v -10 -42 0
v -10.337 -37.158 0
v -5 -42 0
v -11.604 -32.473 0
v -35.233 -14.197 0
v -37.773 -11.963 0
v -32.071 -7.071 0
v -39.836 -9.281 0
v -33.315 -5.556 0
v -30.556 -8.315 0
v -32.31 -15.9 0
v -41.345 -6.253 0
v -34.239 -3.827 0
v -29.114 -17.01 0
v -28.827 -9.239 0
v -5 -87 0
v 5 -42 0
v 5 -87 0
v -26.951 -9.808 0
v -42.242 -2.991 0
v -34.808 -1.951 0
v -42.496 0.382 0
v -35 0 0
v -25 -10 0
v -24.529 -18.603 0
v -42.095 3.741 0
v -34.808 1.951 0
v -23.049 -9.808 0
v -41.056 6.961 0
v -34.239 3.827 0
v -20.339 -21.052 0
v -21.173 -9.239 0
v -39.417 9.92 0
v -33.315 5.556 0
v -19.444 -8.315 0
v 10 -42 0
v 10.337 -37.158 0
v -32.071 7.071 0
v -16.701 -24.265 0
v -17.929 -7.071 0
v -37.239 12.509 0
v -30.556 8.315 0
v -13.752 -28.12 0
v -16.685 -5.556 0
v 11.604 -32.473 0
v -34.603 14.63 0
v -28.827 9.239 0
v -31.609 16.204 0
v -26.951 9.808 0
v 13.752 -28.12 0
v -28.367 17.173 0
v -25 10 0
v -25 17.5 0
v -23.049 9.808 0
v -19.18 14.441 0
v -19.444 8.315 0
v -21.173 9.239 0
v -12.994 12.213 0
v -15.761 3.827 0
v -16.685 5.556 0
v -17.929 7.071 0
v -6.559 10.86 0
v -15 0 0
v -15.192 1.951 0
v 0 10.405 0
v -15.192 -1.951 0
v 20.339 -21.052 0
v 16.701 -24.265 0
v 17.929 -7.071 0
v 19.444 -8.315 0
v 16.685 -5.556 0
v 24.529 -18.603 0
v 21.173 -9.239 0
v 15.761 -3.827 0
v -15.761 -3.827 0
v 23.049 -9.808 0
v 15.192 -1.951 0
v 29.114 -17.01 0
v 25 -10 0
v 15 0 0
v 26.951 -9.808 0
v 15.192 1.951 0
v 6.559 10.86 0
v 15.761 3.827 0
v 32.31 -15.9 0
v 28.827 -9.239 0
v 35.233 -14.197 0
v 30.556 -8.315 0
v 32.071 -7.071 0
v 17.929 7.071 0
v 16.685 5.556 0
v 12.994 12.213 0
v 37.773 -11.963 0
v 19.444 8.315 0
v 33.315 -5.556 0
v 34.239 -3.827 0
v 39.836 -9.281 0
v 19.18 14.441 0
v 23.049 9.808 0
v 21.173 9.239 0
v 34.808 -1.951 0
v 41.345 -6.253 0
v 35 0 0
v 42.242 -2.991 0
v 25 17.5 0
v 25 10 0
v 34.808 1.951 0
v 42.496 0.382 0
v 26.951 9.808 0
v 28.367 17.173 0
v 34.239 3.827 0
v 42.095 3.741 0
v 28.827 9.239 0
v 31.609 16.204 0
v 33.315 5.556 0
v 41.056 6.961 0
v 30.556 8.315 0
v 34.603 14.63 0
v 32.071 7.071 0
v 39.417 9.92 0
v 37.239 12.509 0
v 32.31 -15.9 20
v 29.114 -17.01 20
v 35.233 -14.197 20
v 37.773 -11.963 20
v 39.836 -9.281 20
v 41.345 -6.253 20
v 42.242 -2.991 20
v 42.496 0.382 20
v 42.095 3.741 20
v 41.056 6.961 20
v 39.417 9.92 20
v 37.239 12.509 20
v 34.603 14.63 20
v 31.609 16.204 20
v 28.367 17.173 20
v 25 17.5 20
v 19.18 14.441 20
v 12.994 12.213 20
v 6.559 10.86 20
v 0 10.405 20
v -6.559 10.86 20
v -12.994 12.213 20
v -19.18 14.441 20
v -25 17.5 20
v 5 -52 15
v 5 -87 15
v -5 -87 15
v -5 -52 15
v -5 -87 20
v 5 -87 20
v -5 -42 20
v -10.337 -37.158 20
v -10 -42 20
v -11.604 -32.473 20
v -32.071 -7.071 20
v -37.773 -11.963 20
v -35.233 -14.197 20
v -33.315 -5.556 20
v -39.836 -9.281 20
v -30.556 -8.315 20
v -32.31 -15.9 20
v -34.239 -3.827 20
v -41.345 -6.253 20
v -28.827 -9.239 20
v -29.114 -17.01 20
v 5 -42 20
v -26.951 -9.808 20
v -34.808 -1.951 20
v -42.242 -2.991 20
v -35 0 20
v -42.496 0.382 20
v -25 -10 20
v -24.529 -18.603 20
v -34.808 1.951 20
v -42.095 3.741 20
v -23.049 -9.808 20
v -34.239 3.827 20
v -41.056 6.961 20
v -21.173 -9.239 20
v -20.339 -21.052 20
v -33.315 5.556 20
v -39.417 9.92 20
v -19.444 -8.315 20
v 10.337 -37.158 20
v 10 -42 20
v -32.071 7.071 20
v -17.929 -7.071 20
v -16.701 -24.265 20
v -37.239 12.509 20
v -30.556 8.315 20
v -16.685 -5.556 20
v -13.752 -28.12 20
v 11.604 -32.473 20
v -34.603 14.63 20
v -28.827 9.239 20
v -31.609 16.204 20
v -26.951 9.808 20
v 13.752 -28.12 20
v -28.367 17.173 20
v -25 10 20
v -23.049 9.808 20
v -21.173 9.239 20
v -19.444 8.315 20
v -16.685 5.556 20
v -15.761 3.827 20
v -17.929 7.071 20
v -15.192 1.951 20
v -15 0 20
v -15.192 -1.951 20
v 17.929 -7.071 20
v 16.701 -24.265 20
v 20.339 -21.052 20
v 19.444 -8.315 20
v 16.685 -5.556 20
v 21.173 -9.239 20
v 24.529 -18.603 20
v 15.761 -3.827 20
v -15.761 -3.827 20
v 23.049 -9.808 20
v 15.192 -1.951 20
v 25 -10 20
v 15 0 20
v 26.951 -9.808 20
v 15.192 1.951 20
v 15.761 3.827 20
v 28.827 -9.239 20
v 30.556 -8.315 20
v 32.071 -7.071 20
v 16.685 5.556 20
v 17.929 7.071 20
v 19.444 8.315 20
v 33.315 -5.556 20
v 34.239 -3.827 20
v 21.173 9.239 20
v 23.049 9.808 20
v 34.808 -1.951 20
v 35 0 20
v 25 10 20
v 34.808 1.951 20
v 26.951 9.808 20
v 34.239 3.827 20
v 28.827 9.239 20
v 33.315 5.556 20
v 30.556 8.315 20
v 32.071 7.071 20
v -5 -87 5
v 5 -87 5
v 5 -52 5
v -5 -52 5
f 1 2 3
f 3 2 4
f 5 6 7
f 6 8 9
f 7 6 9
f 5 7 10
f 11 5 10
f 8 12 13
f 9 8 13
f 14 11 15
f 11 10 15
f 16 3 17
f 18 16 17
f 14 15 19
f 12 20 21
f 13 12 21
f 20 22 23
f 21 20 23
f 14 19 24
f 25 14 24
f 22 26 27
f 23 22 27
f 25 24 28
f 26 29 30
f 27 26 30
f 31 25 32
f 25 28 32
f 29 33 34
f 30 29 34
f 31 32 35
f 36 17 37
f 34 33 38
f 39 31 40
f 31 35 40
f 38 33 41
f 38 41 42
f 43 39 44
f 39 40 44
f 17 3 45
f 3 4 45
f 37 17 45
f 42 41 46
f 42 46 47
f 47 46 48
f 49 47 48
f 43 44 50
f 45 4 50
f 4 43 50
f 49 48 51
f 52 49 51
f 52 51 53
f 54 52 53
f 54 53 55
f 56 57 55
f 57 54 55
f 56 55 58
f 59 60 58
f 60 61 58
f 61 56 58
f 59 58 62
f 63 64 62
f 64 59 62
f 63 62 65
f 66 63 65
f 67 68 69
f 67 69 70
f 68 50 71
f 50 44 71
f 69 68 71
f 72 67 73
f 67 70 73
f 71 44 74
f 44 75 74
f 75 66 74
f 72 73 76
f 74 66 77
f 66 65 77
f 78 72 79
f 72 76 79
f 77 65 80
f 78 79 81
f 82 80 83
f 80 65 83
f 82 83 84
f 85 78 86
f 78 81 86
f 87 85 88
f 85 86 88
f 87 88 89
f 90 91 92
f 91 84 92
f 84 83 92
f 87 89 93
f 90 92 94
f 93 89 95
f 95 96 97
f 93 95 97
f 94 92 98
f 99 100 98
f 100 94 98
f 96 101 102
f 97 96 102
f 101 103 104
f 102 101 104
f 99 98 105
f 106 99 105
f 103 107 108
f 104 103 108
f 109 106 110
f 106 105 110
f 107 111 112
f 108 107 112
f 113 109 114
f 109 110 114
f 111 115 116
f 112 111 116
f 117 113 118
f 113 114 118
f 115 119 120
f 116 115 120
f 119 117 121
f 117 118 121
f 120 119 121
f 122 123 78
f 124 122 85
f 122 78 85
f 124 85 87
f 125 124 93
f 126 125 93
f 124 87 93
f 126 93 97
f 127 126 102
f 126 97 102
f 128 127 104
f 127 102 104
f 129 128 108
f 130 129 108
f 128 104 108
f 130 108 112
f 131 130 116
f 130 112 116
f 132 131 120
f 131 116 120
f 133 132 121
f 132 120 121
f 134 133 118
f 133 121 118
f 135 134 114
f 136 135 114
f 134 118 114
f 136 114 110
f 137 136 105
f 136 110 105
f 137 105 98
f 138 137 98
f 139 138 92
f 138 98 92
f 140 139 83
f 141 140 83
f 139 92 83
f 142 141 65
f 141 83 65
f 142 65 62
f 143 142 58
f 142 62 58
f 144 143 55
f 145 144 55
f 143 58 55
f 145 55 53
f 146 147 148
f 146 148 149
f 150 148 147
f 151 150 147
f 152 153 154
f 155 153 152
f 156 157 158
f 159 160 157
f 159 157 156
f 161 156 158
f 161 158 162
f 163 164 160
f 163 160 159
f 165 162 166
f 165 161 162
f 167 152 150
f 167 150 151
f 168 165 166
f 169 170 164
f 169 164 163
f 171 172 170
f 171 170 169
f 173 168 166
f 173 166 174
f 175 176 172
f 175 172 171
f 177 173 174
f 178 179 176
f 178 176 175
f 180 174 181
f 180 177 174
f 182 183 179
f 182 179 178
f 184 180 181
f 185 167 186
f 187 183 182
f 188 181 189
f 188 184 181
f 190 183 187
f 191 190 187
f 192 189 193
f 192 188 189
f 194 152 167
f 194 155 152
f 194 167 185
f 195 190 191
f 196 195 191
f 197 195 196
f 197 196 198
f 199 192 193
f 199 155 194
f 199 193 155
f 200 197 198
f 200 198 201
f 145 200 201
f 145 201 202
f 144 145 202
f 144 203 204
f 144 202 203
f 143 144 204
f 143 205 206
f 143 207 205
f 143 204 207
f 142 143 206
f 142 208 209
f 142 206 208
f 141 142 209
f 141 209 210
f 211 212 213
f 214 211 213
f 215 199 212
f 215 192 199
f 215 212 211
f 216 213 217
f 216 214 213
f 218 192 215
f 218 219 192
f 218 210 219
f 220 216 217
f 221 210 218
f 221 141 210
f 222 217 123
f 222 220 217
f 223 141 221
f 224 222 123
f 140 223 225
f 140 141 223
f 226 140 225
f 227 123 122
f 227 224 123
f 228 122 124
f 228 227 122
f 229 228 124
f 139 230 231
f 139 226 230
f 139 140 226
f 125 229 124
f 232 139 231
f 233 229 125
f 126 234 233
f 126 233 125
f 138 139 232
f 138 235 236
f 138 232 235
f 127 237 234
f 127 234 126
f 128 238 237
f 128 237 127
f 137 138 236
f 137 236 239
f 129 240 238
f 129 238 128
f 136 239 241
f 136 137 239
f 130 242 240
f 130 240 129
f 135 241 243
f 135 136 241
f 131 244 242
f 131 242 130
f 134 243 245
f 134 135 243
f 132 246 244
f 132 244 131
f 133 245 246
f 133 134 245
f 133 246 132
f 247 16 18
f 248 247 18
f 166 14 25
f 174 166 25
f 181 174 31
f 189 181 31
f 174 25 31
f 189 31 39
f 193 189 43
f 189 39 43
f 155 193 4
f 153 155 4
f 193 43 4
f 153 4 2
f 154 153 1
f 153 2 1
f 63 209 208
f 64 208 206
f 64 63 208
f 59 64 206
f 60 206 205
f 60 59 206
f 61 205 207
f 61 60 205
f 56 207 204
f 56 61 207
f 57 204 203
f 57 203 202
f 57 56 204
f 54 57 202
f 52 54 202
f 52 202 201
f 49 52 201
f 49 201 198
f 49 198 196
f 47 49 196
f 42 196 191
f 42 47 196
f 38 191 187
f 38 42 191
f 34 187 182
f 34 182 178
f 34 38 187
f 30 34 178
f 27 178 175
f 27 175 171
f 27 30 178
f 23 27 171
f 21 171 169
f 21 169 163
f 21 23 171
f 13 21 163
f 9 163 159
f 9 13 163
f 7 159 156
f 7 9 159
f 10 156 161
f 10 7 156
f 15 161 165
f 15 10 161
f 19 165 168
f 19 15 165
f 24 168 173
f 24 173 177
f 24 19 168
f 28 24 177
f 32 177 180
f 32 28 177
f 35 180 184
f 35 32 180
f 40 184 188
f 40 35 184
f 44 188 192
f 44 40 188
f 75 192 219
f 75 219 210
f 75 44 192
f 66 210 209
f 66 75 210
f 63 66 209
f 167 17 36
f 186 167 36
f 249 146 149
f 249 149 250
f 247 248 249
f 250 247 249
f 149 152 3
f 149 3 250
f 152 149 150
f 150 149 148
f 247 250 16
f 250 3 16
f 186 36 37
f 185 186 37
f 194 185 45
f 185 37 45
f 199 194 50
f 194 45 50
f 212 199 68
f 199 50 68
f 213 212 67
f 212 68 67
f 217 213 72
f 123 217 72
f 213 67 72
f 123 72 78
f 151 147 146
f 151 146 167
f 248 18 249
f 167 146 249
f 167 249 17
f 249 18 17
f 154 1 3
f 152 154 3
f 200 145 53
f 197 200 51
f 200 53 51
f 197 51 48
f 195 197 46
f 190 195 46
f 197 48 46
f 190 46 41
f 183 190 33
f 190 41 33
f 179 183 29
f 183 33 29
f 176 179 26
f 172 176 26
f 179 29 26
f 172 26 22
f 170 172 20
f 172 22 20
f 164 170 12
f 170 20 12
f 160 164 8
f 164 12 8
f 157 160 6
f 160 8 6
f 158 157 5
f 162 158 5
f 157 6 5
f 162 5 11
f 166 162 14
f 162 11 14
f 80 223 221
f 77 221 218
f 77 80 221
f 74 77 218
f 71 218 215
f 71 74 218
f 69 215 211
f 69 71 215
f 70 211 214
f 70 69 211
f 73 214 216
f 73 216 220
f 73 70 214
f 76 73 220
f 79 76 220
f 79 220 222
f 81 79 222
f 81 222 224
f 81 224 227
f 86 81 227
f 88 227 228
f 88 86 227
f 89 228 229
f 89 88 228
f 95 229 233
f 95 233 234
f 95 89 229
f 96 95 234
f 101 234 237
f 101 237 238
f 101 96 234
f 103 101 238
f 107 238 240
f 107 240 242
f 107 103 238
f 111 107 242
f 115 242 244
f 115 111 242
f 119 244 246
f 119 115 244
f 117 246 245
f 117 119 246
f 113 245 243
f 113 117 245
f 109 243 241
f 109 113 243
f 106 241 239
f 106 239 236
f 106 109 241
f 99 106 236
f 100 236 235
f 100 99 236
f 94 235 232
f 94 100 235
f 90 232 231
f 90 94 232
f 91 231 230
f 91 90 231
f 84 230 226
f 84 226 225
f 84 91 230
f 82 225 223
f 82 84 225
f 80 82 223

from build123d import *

# Parameters (mm, degrees)
SKETCH1_R           = 10
BOSS_EXTRUDE1_DEPTH = 20
SKETCH2_W           = 10
SKETCH2_H           = 35
CUT_EXTRUDE1_DEPTH  = 10


with BuildPart() as part:
    # Sketch1 → Boss-Extrude1 (new body)
    with BuildSketch(Plane.XY):
        with BuildLine():
            Line((5, -42), (10, -42))
            ThreePointArc((10, -42), (15.132819854, -26.12111797), (29.113715132, -17.009625152))
            ThreePointArc((29.113715132, -17.009625152), (42.376973847, 2.071419783), (25, 17.5))
            ThreePointArc((25, 17.5), (0, 10.405357444), (-25, 17.5))
            ThreePointArc((-25, 17.5), (-42.376973847, 2.071419783), (-29.113715132, -17.009625152))
            ThreePointArc((-29.113715132, -17.009625152), (-15.132819854, -26.12111797), (-10, -42))
            Line((-10, -42), (-5, -42))
            Line((-5, -42), (-5, -87))
            Line((-5, -87), (5, -87))
            Line((5, -87), (5, -42))
        make_face()
        with Locations((-25, 0)):
            Circle(SKETCH1_R, mode=Mode.SUBTRACT)
        with Locations(Location((25, 0, 0), (0, 0, 180))):
            Circle(SKETCH1_R, mode=Mode.SUBTRACT)
    extrude(amount=BOSS_EXTRUDE1_DEPTH)

    # Sketch2 → Cut-Extrude1 (cut)
    with BuildSketch(Plane(origin=(5, 0, 0), x_dir=(0, 0, -1), z_dir=(1, 0, 0))):
        with Locations((-10, -69.5)):
            Rectangle(SKETCH2_W, SKETCH2_H)
    extrude(amount=-CUT_EXTRUDE1_DEPTH, mode=Mode.SUBTRACT)


solid = part.part
